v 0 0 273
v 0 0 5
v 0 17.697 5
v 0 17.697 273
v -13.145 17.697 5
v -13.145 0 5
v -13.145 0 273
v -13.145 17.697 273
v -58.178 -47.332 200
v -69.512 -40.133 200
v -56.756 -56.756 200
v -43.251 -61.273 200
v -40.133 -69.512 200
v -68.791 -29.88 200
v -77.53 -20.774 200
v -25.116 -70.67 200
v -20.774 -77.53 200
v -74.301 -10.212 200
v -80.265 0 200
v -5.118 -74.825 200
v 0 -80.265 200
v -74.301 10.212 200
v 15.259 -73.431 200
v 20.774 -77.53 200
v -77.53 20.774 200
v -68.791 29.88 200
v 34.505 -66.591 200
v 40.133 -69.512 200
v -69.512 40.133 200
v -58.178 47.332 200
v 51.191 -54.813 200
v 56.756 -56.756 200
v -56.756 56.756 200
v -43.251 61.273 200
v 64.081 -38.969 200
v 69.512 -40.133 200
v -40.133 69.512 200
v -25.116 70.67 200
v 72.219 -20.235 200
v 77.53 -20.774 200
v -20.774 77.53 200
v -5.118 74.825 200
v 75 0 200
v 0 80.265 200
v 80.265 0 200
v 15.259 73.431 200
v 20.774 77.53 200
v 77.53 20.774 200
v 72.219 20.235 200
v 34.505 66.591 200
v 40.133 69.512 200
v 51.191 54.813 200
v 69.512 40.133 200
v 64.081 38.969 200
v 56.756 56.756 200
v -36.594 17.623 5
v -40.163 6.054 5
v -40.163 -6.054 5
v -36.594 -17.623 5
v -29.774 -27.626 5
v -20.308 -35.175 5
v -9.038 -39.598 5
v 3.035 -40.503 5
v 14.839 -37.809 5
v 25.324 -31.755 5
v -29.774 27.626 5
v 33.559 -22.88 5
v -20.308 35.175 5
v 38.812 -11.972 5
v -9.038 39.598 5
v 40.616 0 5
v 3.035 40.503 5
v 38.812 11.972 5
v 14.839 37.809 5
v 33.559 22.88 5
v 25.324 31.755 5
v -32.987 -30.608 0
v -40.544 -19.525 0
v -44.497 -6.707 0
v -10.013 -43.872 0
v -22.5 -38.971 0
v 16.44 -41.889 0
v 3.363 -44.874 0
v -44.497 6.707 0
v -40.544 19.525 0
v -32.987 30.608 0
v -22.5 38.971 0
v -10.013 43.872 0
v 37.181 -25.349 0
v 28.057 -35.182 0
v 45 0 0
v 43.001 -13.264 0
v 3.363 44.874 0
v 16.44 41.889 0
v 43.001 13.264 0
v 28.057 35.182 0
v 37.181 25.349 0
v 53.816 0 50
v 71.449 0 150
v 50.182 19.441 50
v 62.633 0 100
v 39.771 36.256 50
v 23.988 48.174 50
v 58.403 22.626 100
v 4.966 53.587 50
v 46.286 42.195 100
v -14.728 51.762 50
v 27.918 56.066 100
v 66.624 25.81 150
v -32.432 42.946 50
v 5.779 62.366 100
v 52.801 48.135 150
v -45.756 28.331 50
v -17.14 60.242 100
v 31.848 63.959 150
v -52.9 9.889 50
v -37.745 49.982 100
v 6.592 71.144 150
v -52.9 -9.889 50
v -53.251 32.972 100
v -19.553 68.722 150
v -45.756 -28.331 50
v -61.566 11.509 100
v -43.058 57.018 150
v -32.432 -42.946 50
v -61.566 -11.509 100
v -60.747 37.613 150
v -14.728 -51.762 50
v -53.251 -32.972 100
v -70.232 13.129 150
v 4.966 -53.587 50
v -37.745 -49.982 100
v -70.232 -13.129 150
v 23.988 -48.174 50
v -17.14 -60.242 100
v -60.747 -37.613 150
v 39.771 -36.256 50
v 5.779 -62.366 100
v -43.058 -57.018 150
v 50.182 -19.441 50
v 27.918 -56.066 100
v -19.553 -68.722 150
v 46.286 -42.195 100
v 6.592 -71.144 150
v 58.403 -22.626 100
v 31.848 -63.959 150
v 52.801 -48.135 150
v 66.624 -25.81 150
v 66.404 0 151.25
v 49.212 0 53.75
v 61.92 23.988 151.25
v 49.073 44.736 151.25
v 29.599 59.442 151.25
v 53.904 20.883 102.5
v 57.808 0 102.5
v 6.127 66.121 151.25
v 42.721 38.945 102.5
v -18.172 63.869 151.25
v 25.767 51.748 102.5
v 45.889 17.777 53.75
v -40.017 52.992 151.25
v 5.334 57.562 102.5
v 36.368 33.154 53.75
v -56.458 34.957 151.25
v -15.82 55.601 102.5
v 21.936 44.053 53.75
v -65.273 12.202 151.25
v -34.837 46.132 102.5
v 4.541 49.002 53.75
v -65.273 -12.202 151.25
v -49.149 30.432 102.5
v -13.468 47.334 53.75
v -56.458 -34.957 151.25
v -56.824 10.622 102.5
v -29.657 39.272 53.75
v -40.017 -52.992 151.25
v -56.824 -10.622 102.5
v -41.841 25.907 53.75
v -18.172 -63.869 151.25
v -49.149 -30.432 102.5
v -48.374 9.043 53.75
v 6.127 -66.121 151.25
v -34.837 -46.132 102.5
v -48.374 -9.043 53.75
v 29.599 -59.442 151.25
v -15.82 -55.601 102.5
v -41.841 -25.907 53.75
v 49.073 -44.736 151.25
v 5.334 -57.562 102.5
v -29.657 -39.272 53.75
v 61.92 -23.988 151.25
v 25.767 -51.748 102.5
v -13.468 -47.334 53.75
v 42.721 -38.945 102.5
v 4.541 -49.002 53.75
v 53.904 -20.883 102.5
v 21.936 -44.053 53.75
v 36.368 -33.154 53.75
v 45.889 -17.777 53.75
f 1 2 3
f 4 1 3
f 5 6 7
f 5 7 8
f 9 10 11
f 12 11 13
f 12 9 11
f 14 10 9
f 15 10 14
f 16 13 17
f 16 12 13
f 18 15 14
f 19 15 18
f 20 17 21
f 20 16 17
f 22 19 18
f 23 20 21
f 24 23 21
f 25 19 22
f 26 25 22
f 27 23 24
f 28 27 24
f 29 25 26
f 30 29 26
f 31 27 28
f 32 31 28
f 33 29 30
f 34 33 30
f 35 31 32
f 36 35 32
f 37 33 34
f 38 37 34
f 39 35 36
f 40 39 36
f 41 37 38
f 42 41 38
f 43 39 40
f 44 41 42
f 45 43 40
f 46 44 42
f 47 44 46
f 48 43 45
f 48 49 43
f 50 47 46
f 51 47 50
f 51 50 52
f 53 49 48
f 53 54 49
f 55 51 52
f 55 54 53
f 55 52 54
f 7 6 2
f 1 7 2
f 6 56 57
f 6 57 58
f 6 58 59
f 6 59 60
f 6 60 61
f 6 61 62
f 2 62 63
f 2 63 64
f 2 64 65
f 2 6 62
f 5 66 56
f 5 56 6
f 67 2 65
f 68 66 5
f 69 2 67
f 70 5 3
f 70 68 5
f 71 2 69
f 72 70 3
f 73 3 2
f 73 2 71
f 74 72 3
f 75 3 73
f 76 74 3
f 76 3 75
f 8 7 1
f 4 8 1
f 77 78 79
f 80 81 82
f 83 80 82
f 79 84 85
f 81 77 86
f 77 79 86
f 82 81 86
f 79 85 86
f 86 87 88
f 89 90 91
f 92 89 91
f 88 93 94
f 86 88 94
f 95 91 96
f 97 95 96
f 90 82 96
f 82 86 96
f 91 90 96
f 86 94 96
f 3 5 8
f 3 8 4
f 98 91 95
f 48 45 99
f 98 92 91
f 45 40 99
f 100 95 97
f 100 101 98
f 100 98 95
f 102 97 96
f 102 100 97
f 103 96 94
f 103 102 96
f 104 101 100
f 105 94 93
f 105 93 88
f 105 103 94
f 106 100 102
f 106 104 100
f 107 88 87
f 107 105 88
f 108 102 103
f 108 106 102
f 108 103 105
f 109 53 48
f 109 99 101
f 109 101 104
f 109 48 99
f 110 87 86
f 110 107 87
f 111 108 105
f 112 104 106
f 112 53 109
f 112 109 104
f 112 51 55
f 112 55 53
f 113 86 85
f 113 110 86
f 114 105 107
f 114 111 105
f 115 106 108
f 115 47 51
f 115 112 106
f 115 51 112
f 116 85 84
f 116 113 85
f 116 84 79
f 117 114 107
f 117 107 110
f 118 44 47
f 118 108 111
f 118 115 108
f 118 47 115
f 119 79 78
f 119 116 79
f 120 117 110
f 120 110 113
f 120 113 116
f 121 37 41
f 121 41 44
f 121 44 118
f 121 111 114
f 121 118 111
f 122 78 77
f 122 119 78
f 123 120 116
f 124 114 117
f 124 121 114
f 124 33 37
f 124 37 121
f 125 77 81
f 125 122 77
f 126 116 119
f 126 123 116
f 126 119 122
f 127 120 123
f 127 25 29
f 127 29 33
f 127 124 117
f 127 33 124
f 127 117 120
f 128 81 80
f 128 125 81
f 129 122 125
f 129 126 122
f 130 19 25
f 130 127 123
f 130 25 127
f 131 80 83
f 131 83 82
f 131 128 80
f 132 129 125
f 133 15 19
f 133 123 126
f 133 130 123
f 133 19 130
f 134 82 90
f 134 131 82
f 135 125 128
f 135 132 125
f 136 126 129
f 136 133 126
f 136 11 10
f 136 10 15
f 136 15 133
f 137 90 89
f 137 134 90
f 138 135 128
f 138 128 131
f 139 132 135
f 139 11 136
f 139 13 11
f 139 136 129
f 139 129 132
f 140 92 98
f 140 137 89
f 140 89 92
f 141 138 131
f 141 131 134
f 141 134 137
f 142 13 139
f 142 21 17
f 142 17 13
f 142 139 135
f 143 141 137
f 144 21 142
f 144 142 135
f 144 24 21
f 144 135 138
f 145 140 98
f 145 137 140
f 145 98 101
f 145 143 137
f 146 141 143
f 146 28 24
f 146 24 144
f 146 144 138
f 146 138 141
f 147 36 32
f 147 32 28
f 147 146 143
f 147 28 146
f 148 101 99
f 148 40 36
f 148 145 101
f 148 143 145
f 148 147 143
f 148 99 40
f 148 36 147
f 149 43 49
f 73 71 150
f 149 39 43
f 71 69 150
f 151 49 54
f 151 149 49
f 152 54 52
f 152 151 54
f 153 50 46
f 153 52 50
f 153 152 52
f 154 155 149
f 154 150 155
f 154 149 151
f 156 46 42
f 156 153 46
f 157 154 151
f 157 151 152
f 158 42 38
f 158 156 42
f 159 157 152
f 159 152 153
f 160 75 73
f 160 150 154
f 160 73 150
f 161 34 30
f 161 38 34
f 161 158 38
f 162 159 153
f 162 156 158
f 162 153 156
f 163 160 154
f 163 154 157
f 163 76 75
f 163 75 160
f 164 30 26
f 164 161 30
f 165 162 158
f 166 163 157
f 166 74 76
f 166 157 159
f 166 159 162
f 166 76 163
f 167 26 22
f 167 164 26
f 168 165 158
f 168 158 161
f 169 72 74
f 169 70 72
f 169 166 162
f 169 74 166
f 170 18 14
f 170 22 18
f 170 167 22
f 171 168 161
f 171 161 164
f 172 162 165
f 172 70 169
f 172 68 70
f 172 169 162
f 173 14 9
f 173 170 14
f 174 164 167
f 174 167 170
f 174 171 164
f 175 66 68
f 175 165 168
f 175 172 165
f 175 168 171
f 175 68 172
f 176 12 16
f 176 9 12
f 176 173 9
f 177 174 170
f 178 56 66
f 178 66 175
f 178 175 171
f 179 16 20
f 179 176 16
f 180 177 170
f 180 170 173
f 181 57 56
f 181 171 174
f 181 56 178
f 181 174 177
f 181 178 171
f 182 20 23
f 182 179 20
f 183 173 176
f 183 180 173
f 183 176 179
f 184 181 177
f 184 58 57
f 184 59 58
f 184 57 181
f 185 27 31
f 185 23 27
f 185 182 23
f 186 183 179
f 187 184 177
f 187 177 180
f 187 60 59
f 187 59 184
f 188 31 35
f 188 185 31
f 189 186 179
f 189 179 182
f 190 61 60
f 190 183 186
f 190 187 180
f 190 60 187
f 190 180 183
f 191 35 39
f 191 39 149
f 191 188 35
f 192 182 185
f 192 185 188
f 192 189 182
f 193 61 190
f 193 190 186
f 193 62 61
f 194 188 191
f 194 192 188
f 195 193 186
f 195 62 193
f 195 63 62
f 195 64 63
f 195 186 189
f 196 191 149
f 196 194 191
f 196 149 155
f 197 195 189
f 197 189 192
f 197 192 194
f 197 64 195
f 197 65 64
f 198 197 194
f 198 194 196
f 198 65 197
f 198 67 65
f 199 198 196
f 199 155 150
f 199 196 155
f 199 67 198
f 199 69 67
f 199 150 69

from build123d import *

# Parameters (mm, degrees)
F0_R     = 45
F1_DEPTH = 200
F1_TAPER = -10
F2_R     = 75
F3_DEPTH = 195
F3_TAPER = 10
F5_W     = 13.1450463086
F5_H     = 17.6969505847
F6_DEPTH = 268


with BuildPart() as f1:
    # F0 (on Top) → F1 (new body)
    with BuildSketch(Plane.XY):
        Circle(F0_R)
    extrude(amount=F1_DEPTH, taper=F1_TAPER)

    # F2 (on face) → F3 (cut)
    with BuildSketch(Plane.XY.offset(200)):
        Circle(F2_R)
    extrude(amount=-F3_DEPTH, taper=F3_TAPER, mode=Mode.SUBTRACT)

    # F5 (on offset) → F6 (join)
    with BuildSketch(Plane.XY.offset(5)):
        with Locations((-6.5725231543, 8.8484752923)):
            Rectangle(F5_W, F5_H)
    extrude(amount=F6_DEPTH)


solid = f1.part
